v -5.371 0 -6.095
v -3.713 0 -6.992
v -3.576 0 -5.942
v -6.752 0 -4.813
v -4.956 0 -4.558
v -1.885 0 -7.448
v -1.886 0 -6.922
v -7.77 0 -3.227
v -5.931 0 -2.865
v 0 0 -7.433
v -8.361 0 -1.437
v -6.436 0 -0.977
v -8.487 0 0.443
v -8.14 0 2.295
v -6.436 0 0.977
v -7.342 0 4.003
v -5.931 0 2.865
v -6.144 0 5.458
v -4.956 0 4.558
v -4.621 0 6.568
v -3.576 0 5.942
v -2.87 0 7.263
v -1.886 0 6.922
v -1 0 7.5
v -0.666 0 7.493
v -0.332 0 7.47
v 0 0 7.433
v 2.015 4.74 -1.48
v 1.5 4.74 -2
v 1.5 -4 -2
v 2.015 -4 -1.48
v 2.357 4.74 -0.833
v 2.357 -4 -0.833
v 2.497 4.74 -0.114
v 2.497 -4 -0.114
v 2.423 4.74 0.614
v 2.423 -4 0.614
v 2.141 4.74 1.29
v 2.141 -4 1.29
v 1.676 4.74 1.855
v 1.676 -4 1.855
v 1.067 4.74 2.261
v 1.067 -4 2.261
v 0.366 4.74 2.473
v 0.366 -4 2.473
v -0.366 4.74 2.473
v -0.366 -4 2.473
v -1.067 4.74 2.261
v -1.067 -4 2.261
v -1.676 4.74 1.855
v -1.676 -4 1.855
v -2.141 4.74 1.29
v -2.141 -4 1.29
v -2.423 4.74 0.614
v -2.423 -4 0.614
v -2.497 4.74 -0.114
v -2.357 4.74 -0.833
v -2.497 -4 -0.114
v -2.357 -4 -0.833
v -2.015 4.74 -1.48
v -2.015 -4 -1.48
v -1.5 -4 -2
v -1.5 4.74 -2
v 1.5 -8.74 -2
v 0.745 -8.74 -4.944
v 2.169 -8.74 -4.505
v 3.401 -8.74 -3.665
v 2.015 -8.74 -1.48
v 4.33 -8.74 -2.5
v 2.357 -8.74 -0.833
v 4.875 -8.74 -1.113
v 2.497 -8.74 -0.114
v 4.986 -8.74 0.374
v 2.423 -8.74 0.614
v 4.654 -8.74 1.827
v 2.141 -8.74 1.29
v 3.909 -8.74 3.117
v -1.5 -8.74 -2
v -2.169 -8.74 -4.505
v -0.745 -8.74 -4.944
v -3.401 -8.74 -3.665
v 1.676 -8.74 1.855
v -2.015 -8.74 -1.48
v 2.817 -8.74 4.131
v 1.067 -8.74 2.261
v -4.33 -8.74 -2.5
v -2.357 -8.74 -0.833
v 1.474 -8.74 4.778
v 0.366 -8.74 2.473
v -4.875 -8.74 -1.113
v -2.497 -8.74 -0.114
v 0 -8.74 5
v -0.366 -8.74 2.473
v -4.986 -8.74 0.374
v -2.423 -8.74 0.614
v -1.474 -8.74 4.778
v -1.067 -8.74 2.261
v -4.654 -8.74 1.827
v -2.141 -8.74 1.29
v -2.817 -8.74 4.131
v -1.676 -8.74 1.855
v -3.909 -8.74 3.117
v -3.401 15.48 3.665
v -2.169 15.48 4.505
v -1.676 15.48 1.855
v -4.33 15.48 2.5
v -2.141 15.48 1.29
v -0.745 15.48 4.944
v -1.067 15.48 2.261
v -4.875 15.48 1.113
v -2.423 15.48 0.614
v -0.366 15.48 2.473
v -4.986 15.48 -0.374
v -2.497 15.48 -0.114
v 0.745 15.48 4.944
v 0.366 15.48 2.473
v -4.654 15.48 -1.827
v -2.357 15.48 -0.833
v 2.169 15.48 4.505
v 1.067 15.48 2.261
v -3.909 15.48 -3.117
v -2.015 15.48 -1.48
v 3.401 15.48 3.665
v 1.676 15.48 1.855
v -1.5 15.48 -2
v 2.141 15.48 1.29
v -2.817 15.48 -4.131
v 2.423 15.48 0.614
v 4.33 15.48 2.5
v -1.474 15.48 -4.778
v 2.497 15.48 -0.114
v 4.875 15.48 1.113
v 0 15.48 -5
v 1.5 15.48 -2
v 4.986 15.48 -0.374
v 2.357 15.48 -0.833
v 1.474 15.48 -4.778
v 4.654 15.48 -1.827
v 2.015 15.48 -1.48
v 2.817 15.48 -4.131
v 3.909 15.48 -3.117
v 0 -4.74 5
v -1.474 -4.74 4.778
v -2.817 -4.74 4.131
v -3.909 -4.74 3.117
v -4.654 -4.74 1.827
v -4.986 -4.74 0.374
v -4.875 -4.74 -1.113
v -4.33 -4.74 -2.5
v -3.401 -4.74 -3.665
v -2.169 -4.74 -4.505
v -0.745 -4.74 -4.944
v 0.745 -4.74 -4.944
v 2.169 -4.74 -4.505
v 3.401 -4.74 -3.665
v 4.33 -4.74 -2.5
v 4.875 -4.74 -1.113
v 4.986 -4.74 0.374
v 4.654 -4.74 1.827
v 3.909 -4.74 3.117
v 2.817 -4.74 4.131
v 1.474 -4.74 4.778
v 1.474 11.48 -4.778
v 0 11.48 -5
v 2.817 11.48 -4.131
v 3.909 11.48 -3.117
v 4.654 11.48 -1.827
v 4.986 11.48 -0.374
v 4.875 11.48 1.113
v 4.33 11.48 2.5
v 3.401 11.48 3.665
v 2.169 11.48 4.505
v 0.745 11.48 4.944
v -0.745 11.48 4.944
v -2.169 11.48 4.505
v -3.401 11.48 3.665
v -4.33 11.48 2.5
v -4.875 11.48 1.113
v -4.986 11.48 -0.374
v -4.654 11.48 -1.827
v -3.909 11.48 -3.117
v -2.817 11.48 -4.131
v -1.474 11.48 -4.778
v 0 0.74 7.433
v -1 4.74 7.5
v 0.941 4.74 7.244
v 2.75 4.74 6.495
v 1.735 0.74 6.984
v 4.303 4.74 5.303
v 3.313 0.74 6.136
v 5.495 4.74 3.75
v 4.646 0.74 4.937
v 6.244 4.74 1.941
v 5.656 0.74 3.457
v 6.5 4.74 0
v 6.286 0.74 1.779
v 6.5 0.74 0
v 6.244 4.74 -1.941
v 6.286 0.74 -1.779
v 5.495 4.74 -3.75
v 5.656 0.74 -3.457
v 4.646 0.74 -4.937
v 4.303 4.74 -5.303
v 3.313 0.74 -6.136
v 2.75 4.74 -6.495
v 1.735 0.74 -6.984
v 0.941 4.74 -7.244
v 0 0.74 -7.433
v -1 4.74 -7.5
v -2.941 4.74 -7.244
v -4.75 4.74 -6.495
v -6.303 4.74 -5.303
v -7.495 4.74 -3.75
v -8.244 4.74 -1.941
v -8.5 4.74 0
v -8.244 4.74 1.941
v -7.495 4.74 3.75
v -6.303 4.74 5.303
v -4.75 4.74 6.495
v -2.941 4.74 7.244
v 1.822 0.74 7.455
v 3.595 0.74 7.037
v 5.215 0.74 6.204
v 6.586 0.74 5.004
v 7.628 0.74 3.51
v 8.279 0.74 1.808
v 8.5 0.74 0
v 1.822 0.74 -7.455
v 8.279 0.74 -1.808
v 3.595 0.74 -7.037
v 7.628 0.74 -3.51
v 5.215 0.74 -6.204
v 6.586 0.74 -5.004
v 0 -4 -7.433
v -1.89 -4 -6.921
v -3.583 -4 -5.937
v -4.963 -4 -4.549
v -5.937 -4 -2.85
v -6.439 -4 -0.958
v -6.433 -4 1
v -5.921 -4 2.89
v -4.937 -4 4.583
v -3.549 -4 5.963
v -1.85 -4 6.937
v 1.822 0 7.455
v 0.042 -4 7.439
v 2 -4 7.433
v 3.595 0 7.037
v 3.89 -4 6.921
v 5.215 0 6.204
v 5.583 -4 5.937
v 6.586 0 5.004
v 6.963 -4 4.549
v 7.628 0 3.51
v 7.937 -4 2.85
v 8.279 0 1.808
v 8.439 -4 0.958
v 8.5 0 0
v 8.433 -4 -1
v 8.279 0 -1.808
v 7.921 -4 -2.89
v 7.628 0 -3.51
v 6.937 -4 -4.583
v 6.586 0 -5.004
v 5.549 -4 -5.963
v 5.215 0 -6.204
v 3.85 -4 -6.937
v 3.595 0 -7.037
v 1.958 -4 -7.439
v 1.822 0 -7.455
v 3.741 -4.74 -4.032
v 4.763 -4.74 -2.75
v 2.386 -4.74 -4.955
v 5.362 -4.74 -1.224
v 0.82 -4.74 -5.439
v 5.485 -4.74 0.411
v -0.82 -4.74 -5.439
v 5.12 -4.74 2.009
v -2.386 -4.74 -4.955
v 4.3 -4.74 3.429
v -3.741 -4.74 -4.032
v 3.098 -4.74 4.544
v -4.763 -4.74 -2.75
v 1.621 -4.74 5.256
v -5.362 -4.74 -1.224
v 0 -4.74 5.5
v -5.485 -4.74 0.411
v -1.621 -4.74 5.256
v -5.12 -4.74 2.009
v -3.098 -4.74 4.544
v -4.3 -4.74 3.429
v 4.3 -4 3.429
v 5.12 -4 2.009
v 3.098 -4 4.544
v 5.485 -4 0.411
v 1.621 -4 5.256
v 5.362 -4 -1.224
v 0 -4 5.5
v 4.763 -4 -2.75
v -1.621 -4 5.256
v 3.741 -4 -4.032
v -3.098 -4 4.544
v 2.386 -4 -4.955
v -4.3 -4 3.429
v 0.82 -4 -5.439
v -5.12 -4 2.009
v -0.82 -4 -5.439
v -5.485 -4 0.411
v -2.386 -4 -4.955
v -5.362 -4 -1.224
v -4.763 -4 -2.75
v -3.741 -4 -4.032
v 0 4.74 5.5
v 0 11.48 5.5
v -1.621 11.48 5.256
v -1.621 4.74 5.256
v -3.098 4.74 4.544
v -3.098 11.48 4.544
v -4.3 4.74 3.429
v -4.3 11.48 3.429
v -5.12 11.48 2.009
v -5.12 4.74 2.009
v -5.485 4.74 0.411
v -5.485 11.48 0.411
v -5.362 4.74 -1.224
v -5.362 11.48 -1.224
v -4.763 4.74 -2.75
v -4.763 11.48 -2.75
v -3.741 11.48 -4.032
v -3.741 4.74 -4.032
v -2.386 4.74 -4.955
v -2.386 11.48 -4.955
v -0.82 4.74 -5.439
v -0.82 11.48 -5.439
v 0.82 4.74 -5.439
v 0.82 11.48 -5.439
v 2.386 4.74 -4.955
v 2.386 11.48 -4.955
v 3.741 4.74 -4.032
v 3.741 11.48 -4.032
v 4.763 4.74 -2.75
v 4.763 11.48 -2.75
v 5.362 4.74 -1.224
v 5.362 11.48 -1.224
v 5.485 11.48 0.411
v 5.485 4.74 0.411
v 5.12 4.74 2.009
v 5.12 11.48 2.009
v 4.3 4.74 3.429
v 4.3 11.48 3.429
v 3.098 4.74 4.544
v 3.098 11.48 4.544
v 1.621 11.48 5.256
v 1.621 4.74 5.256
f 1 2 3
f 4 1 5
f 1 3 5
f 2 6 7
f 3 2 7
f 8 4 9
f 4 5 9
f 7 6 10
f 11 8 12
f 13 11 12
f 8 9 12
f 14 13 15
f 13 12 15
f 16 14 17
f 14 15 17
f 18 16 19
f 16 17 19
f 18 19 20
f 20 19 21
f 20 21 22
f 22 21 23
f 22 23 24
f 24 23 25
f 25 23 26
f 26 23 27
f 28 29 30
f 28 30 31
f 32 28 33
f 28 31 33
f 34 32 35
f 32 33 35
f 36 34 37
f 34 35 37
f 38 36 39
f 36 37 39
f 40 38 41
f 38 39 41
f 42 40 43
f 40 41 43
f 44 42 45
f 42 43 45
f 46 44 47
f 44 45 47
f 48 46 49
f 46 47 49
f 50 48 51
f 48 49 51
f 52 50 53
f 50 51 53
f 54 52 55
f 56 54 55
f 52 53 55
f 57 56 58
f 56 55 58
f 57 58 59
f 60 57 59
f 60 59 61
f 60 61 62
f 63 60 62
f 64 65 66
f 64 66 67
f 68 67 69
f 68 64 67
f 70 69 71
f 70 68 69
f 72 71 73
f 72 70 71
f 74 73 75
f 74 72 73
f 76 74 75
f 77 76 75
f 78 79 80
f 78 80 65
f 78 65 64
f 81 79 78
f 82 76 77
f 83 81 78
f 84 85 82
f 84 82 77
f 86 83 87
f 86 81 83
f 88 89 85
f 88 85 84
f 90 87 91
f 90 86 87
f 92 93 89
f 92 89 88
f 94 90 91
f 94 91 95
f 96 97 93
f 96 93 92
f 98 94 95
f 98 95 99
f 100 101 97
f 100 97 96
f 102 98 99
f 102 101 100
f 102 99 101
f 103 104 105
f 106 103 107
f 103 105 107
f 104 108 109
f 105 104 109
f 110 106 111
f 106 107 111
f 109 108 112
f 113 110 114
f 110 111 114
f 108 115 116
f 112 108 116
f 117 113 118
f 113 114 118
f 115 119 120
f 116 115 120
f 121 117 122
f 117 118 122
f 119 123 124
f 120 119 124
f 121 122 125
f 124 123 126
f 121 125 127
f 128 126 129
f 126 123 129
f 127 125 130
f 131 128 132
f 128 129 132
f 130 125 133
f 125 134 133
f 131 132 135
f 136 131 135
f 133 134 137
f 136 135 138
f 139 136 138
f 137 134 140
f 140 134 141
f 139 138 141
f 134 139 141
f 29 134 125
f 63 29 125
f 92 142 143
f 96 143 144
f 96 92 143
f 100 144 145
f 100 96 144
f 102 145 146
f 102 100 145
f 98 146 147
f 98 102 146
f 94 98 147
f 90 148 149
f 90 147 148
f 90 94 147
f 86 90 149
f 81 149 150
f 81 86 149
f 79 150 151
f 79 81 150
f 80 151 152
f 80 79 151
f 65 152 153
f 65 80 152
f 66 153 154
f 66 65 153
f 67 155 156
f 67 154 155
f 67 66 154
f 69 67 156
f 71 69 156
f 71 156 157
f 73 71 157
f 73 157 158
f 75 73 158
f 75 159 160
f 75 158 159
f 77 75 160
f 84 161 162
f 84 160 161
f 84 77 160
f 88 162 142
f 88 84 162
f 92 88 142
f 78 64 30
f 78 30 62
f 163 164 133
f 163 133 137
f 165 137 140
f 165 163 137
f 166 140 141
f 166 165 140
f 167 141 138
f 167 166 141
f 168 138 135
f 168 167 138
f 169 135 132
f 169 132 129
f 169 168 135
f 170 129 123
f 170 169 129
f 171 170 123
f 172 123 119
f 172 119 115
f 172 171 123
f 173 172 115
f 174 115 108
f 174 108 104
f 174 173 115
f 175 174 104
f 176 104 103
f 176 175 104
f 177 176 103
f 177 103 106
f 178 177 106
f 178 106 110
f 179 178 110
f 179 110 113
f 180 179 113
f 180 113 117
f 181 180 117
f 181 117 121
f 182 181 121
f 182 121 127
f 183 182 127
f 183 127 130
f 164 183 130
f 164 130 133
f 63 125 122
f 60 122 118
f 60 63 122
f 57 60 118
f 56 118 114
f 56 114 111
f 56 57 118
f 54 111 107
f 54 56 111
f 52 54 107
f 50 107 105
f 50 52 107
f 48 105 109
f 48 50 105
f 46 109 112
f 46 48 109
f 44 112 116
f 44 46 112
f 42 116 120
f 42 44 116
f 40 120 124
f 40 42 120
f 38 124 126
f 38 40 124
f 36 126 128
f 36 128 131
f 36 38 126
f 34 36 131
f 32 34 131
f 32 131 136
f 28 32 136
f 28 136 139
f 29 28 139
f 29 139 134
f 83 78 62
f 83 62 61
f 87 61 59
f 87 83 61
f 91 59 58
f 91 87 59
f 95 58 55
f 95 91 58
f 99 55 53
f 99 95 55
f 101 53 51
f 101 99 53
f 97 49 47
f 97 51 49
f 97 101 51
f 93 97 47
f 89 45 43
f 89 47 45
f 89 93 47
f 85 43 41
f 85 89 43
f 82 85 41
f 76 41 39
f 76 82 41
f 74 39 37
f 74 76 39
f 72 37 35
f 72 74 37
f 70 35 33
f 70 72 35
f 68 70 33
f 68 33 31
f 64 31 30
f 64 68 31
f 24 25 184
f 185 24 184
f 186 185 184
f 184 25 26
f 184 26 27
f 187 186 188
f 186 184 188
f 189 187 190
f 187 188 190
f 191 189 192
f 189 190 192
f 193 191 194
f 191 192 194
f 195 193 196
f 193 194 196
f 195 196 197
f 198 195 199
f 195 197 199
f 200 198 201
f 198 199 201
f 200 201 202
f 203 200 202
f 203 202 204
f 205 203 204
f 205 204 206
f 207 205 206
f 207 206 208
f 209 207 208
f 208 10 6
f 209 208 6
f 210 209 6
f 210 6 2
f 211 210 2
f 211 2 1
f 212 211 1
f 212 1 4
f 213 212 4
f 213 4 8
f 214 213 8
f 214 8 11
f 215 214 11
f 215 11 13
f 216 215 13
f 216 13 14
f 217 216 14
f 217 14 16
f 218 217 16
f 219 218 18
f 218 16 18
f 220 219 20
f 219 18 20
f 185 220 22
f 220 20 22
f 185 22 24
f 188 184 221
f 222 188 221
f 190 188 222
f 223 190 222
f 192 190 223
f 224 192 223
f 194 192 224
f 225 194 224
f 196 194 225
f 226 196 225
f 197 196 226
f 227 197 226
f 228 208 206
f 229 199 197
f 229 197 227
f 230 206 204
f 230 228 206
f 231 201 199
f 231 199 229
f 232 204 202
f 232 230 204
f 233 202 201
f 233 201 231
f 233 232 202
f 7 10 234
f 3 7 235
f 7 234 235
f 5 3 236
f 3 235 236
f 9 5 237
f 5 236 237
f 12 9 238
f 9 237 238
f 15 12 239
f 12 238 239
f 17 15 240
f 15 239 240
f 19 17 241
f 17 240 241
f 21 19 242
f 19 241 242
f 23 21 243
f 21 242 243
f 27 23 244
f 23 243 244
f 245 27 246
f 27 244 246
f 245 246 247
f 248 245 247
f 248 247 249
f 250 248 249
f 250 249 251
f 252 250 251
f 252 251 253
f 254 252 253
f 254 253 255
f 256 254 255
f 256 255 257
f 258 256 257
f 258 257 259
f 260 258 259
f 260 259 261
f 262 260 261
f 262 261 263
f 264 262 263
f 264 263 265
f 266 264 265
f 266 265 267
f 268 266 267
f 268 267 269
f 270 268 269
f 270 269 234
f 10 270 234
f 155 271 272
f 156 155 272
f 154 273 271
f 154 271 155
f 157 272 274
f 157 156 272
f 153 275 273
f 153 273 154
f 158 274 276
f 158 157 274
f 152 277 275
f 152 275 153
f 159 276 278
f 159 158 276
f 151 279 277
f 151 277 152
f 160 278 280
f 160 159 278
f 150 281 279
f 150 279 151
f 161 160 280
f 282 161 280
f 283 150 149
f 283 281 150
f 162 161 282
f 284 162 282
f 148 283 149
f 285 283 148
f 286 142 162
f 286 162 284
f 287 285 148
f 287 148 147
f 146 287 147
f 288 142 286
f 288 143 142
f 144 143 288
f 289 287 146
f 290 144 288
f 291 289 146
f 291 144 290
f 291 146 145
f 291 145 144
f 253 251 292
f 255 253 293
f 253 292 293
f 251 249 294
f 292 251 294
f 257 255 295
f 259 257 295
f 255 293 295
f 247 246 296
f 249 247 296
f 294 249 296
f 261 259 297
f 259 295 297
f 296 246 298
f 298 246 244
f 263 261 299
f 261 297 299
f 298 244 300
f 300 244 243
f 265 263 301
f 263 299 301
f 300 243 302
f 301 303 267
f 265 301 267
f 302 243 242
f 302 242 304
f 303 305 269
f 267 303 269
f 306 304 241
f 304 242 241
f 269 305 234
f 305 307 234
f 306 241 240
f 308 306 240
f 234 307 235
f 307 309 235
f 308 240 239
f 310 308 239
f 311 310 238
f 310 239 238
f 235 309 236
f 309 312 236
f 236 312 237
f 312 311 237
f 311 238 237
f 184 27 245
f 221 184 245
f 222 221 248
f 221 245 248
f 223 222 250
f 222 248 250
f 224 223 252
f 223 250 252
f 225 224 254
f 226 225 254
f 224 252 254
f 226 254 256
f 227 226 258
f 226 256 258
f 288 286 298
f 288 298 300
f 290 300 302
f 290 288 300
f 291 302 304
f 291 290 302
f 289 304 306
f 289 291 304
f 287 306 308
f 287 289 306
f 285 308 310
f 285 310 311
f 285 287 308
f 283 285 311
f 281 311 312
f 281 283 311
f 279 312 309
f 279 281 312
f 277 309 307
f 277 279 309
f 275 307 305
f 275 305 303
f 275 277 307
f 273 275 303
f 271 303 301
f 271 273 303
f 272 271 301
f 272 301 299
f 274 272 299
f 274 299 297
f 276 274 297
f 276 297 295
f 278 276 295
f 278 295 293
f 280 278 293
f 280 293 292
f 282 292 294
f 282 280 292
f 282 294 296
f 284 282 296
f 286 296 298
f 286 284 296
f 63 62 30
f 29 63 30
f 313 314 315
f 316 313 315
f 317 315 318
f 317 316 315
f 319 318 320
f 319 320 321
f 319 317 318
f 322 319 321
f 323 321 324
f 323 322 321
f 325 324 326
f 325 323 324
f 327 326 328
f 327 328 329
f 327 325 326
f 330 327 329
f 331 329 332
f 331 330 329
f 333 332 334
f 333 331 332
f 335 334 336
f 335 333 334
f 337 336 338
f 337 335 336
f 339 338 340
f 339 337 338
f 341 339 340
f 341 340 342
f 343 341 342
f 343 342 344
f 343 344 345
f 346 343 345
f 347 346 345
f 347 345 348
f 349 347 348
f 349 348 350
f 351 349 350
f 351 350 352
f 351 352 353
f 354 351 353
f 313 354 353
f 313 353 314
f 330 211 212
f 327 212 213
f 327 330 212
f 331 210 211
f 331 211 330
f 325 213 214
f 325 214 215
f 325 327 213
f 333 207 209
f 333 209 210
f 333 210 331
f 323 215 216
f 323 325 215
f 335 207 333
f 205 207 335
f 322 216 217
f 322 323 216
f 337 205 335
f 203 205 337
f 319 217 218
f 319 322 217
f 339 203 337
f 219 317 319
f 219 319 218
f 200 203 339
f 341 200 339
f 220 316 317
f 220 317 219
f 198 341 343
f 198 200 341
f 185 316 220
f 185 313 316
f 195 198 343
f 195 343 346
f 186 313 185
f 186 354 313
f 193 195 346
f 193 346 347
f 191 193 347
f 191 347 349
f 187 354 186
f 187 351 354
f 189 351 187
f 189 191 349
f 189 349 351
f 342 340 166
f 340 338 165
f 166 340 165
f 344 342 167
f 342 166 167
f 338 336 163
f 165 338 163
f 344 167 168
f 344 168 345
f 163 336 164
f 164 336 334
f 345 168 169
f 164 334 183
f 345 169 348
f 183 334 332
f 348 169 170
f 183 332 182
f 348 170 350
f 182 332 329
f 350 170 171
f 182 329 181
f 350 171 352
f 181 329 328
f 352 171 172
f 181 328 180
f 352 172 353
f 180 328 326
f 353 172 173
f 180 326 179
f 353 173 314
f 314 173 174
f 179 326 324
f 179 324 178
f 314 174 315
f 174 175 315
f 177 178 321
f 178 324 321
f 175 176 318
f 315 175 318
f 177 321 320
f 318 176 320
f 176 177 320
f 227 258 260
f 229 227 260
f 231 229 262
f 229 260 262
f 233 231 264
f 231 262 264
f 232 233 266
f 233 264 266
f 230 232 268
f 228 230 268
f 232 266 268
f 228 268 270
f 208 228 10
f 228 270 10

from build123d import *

# Parameters (mm, degrees)
SKETCH1_R           = 7.5
BOSS_EXTRUDE1_DEPTH = 4.74
BOSS_EXTRUDE2_DEPTH = 0.74
BOSS_EXTRUDE3_START = -4
SKETCH1_4_R         = 7.5
BOSS_EXTRUDE3_DEPTH = 4
BOSS_EXTRUDE4_START = 4.74
SKETCH2_R           = 5
BOSS_EXTRUDE4_DEPTH = 4.74
BOSS_EXTRUDE5_START = 0.74
SKETCH2_3_R         = 5.5
SKETCH2_3_R_2       = 5
BOSS_EXTRUDE5_DEPTH = 0.74
SKETCH2_5_R         = 5.5
SKETCH2_5_R_2       = 5
BOSS_EXTRUDE6_DEPTH = 15.48
SKETCH2_6_R         = 5
BOSS_EXTRUDE7_DEPTH = 19.48


with BuildPart() as part:
    # Sketch1 → Boss-Extrude1 (new body)
    with BuildSketch(Plane(origin=(0, 0, 0), x_dir=(1, 0, 0), z_dir=(0, 1, 0))):
        with Locations((-1, 0)):
            Circle(SKETCH1_R)
        with BuildLine():
            ThreePointArc((1.5, 2), (0, -2.5), (-1.5, 2))
            Line((-1.5, 2), (1.5, 2))
        make_face(mode=Mode.SUBTRACT)
    extrude(amount=BOSS_EXTRUDE1_DEPTH)

    # Sketch1<3> → Boss-Extrude2 (add)
    with BuildSketch(Plane(origin=(0, 0, 0), x_dir=(1, 0, 0), z_dir=(0, 1, 0))):
        with BuildLine():
            ThreePointArc((0, -7.433034374), (5.937104415, -5.645794895), (8.5, 0))
            ThreePointArc((8.5, 0), (5.937104415, 5.645794895), (0, 7.433034374))
            ThreePointArc((0, 7.433034374), (4.645794895, 4.937104415), (6.5, 0))
            ThreePointArc((6.5, 0), (4.645794895, -4.937104415), (0, -7.433034374))
        make_face()
    extrude(amount=BOSS_EXTRUDE2_DEPTH)

    # Sketch1<4> → Boss-Extrude3 (add)
    with BuildSketch(Plane(origin=(0, 0, 0), x_dir=(1, 0, 0), z_dir=(0, 1, 0)).offset(BOSS_EXTRUDE3_START)):
        with Locations((1, 0)):
            Circle(SKETCH1_4_R)
        with BuildLine():
            ThreePointArc((1.5, 2), (0, -2.5), (-1.5, 2))
            Line((-1.5, 2), (1.5, 2))
        make_face(mode=Mode.SUBTRACT)
    extrude(amount=BOSS_EXTRUDE3_DEPTH)

    # Sketch2 → Boss-Extrude4 (add)
    with BuildSketch(Plane.XZ.offset(4).offset(BOSS_EXTRUDE4_START)):
        Circle(SKETCH2_R)
        with BuildLine():
            Line((1.5, -2), (-1.5, -2))
            ThreePointArc((-1.5, -2), (0, 2.5), (1.5, -2))
        make_face(mode=Mode.SUBTRACT)
    extrude(amount=-BOSS_EXTRUDE4_DEPTH)

    # Sketch2<3> → Boss-Extrude5 (add)
    with BuildSketch(Plane.XZ.offset(4).offset(BOSS_EXTRUDE5_START)):
        Circle(SKETCH2_3_R)
        Circle(SKETCH2_3_R_2, mode=Mode.SUBTRACT)
    extrude(amount=-BOSS_EXTRUDE5_DEPTH)

    # Sketch2<5> → Boss-Extrude6 (add)
    with BuildSketch(Plane.XZ.offset(4)):
        Circle(SKETCH2_5_R)
        Circle(SKETCH2_5_R_2, mode=Mode.SUBTRACT)
    extrude(amount=-BOSS_EXTRUDE6_DEPTH)

    # Sketch2<6> → Boss-Extrude7 (add)
    with BuildSketch(Plane.XZ.offset(4)):
        Circle(SKETCH2_6_R)
        with BuildLine():
            Line((1.5, -2), (-1.5, -2))
            ThreePointArc((-1.5, -2), (0, 2.5), (1.5, -2))
        make_face(mode=Mode.SUBTRACT)
    extrude(amount=-BOSS_EXTRUDE7_DEPTH)


solid = part.part
